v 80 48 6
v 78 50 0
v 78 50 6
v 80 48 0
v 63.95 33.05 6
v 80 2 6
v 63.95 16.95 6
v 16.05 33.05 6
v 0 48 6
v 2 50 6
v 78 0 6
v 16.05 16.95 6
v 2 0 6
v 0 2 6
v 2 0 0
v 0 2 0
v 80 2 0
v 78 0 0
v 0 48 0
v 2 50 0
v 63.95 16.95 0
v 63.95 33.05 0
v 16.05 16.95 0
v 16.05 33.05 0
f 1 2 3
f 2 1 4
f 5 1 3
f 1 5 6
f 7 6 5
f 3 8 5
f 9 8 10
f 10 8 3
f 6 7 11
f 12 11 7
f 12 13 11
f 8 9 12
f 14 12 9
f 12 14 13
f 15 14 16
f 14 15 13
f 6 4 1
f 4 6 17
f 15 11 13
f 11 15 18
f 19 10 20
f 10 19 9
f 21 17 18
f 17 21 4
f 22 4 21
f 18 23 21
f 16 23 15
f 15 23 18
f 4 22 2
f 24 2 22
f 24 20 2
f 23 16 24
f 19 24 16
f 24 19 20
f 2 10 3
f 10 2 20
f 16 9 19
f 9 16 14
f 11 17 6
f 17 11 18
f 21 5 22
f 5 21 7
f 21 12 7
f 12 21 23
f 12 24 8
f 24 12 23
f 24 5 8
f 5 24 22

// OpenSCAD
$fn = 32;

// ----------------------------------------------------------------------
// Windowed plate: 1 voids, 80 x 50 x 6 mm
// ----------------------------------------------------------------------

// --- parameters (mm) ---
plate_l = 80;             // plate length, X
plate_w = 50;             // plate width, Y
plate_t = 6;              // plate thickness, Z
edge_margin = 12;         // wall from the plate edge to any window
win1_l = 47.9;            // window length
win1_w = 16.1;            // window width
depth_1 = 6;              // depth of void 1 (full thickness = through)
corner_c = 2;             // corner chamfer of the plate

profile = [[2, 0], [78, 0], [80, 2], [80, 48], [78, 50], [2, 50], [0, 48], [0, 2]];  // primary outline, 8 points, counter clockwise
void_1 = [[16.05, 16.95], [63.95, 16.95], [63.95, 33.05], [16.05, 33.05]];  // large central window, 4 points

// --- the one profile operation ---
difference() {
  linear_extrude(height = plate_t) polygon(points = profile);
  translate([0, 0, -1])
    linear_extrude(height = plate_t + 2) polygon(points = void_1);
}
